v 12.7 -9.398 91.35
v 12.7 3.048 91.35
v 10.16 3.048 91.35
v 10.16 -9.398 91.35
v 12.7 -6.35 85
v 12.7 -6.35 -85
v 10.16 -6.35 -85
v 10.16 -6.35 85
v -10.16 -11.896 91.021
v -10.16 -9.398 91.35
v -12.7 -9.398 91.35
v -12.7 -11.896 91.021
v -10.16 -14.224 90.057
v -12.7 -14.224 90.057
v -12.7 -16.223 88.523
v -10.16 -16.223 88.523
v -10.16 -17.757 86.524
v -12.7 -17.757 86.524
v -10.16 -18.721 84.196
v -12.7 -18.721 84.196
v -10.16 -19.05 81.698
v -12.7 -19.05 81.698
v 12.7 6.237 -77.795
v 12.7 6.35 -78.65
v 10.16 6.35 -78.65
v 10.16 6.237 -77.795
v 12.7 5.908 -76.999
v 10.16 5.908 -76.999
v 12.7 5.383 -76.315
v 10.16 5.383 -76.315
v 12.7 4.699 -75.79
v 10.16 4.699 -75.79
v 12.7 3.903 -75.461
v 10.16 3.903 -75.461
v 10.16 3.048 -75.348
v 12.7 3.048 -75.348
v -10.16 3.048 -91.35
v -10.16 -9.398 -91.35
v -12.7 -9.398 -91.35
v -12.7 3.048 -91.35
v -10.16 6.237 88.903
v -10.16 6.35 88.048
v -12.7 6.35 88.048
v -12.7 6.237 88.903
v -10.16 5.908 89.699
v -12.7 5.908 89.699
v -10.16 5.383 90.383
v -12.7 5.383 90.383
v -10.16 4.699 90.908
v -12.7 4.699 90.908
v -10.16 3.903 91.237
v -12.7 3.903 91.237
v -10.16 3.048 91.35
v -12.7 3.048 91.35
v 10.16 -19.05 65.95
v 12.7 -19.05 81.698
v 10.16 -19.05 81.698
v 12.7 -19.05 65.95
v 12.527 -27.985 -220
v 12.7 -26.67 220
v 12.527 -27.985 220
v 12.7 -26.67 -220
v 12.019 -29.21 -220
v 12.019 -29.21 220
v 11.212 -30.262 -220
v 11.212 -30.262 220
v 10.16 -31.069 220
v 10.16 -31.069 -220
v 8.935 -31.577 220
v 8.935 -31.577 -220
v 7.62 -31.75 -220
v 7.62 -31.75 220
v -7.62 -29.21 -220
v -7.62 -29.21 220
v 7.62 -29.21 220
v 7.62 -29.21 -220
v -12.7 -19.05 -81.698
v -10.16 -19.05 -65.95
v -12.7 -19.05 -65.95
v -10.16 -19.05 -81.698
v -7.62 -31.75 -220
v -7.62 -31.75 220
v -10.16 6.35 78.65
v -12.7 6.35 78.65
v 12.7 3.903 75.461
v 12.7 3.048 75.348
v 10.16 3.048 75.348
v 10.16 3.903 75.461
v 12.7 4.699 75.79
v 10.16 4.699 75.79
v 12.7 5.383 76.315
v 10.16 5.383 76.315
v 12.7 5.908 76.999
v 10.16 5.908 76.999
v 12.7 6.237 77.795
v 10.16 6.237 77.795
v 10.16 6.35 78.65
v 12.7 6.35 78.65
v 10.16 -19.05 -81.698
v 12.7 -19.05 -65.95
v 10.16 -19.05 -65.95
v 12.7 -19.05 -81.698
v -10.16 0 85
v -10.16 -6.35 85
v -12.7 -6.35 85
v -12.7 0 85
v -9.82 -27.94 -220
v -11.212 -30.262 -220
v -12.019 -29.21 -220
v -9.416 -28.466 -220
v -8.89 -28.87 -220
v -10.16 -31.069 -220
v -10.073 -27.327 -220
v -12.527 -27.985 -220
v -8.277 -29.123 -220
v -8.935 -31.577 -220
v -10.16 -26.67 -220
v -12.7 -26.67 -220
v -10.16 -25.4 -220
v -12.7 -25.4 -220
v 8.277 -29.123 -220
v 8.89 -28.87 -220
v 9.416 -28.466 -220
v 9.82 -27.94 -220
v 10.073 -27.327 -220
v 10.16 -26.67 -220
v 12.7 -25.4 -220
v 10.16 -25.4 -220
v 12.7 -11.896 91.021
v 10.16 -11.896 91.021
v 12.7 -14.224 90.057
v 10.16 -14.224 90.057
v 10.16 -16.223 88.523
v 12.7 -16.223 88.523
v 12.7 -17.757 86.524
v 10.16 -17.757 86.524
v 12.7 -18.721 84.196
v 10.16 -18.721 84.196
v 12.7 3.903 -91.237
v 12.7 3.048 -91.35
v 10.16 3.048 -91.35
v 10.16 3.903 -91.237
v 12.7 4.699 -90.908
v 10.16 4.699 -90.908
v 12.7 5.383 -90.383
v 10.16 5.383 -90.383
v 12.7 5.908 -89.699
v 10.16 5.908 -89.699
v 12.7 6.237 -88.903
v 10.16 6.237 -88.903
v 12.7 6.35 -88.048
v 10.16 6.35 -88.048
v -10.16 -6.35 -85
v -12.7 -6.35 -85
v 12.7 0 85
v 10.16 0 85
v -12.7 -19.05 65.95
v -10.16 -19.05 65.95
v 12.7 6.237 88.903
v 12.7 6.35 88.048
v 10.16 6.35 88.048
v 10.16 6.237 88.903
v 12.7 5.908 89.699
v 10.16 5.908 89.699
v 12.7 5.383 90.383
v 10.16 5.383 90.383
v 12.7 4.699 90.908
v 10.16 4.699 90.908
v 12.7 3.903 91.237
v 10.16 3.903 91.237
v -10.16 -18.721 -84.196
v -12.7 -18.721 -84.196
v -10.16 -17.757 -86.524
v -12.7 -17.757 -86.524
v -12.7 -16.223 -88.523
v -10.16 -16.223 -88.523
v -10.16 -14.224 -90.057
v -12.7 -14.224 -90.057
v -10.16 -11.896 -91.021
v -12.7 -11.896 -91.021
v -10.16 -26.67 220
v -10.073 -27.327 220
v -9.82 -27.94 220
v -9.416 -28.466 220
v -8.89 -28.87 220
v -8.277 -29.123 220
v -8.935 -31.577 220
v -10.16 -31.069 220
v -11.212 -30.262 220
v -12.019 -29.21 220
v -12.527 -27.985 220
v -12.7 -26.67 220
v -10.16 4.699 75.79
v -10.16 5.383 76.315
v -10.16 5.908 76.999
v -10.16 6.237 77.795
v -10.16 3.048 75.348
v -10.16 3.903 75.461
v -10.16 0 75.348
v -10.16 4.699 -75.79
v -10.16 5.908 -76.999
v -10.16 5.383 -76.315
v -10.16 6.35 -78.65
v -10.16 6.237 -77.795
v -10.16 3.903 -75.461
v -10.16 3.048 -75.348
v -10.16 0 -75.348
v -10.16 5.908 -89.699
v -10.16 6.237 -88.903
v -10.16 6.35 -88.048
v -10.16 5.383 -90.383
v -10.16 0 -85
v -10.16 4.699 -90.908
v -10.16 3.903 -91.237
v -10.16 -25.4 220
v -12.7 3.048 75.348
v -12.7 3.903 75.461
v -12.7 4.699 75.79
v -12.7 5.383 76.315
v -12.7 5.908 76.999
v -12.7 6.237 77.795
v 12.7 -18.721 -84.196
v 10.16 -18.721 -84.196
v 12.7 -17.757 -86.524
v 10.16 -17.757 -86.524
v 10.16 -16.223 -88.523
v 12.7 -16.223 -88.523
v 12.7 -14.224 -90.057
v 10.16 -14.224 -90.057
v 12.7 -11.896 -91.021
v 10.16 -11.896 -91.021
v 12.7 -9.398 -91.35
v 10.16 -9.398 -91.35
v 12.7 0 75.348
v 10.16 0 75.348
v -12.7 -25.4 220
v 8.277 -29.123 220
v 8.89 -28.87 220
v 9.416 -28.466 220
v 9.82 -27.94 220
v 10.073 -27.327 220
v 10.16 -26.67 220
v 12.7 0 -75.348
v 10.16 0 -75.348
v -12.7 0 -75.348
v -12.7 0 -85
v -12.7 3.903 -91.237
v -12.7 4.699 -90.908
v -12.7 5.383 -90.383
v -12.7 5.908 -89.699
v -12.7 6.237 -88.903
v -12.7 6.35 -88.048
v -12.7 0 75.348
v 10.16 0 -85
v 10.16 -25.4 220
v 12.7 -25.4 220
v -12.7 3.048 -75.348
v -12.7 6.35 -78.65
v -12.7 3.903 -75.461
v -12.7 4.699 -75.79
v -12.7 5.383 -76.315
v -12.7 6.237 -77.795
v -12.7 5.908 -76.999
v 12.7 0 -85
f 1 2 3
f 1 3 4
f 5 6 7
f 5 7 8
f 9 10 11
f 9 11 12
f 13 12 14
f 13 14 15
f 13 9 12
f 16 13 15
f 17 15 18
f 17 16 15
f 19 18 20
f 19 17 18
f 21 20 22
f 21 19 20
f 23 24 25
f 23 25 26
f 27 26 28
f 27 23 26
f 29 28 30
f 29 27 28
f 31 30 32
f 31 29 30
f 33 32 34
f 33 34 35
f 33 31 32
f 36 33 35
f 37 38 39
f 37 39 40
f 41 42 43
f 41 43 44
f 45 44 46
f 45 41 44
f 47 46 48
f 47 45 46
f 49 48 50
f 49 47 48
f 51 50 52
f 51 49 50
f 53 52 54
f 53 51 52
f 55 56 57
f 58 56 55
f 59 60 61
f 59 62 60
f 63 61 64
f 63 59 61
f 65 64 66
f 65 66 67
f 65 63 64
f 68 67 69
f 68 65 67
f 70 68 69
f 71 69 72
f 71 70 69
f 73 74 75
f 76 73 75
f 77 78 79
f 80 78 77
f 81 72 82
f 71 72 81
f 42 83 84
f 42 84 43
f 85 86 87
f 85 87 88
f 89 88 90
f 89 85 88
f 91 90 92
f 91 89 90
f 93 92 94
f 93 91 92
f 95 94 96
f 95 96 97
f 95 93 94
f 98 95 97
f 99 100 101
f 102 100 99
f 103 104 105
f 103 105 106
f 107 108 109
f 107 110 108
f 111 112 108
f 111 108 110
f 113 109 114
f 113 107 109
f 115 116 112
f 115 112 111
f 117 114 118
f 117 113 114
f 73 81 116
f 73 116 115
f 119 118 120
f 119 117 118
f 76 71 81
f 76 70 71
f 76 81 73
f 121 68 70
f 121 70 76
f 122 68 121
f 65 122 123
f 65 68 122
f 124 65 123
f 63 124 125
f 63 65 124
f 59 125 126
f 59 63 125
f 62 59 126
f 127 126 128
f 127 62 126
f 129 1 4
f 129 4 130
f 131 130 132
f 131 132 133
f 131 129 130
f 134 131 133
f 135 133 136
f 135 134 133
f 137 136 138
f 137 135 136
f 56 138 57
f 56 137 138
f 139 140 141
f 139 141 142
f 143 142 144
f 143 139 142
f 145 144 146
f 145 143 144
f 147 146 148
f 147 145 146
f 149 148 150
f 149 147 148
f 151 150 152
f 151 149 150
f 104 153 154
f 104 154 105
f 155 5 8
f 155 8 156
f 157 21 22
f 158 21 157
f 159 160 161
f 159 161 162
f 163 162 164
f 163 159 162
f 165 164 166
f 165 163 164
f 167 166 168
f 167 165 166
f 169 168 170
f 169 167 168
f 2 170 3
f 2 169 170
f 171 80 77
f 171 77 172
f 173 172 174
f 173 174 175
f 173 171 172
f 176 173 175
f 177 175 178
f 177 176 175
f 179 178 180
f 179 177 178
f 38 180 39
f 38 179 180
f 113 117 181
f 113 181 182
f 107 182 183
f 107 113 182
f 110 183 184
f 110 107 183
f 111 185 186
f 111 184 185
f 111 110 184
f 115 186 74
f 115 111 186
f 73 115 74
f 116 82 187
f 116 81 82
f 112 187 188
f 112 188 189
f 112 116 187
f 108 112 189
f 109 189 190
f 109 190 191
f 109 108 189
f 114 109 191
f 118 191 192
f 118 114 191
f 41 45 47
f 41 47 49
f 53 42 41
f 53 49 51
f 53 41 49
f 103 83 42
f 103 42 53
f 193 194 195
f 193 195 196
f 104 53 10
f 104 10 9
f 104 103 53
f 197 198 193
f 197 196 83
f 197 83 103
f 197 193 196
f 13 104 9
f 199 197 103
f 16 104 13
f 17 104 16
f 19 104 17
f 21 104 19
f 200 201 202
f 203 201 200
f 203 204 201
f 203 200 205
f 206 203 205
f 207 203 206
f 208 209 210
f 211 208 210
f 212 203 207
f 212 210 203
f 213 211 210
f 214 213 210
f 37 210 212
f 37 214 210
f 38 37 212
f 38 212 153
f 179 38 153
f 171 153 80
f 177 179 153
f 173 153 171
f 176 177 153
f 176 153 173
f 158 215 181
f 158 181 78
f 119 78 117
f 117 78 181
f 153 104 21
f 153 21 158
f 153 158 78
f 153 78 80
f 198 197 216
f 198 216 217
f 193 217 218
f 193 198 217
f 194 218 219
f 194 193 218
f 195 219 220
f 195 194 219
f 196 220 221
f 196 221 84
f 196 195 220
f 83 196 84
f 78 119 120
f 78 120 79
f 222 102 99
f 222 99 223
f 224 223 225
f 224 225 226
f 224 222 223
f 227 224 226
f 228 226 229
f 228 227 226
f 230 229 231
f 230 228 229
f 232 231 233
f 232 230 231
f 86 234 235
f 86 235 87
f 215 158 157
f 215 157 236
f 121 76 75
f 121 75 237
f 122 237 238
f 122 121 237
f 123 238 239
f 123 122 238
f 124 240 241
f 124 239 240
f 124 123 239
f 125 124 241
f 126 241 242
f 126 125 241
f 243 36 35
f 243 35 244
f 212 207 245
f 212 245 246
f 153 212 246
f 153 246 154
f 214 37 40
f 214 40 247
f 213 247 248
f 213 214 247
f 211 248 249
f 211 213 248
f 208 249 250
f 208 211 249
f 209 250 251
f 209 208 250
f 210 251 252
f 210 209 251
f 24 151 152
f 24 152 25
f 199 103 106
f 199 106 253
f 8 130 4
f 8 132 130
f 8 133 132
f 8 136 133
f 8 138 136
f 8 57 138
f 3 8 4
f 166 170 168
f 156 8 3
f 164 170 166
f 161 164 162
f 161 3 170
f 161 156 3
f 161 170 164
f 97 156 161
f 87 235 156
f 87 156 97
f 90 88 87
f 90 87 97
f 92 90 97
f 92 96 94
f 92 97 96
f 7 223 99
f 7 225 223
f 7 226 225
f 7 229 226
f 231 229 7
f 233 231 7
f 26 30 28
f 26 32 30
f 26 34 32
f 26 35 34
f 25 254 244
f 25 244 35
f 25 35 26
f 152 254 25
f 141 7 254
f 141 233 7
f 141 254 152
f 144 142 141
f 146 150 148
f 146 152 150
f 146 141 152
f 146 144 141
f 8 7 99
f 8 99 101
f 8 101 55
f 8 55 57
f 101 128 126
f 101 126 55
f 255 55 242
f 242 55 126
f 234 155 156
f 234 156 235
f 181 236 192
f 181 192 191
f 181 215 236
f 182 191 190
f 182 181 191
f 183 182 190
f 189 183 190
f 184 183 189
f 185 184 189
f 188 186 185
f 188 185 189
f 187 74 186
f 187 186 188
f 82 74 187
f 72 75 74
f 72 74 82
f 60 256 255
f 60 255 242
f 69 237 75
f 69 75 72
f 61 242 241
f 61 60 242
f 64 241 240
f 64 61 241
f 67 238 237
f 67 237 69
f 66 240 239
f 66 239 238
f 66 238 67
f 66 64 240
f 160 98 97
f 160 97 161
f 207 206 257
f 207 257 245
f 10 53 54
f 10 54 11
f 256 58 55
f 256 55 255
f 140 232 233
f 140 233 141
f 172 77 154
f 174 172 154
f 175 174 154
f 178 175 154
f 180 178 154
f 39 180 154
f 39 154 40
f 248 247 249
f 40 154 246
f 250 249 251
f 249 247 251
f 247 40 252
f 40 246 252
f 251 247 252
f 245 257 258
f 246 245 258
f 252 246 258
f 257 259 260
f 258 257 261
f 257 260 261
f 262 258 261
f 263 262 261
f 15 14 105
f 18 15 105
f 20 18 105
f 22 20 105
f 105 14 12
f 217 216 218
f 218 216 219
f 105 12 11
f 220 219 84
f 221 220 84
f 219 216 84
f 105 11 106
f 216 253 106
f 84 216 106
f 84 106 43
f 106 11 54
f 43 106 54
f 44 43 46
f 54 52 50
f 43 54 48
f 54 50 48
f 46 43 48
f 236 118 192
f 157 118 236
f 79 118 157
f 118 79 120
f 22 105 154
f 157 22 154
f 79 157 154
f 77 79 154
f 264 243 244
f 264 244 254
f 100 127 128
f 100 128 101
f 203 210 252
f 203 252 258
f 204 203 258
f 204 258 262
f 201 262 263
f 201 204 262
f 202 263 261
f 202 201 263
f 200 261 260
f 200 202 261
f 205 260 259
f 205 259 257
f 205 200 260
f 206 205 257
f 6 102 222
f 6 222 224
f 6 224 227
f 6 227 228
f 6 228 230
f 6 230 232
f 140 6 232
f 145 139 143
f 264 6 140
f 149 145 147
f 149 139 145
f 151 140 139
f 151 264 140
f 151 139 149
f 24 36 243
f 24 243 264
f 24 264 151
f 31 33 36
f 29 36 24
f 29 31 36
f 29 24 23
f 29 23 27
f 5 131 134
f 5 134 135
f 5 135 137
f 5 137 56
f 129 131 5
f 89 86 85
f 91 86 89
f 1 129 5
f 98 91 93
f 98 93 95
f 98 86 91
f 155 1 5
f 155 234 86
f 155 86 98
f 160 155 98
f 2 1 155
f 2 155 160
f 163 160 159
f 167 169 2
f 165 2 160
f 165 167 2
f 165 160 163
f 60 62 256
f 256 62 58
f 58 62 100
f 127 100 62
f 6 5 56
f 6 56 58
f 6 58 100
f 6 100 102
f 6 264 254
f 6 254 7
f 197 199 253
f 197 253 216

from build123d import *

# Parameters (mm, degrees)
F1_DEPTH      = 12.7
F2_R          = 5.08
F4_DEPTH      = 220.001
F4_DEPTH_BACK = 220.001


with BuildPart() as f1:
    # F0 (on Right) → F1 (new body, symmetric)
    with BuildSketch(Plane.YZ):
        with BuildLine():
            Line((-25.4, 220), (-31.75, 220))
            Line((-31.75, 220), (-31.75, -220))
            Line((-31.75, -220), (-25.4, -220))
            Line((-25.4, -220), (-19.05, -65.95))
            Line((-19.05, -65.95), (-19.05, -81.698))
            ThreePointArc((-19.05, -81.698), (-16.222995, -88.522995), (-9.398, -91.35))
            Line((-9.398, -91.35), (3.048, -91.35))
            ThreePointArc((3.048, -91.35), (5.382867, -90.382867), (6.35, -88.048))
            Line((6.35, -88.048), (6.35, -78.65))
            ThreePointArc((6.35, -78.65), (5.382867, -76.315133), (3.048, -75.348))
            Line((3.048, -75.348), (0, -75.348))
            Line((0, -75.348), (0, -85))
            Line((0, -85), (-6.35, -85))
            Line((-6.35, -85), (-6.35, 85))
            Line((-6.35, 85), (0, 85))
            Line((0, 85), (0, 75.348))
            Line((0, 75.348), (3.048, 75.348))
            ThreePointArc((3.048, 75.348), (5.382867, 76.315133), (6.35, 78.65))
            Line((6.35, 78.65), (6.35, 88.048))
            ThreePointArc((6.35, 88.048), (5.382867, 90.382867), (3.048, 91.35))
            Line((3.048, 91.35), (-9.398, 91.35))
            ThreePointArc((-9.398, 91.35), (-16.222995, 88.522995), (-19.05, 81.698))
            Line((-19.05, 81.698), (-19.05, 65.95))
            Line((-19.05, 65.95), (-25.4, 220))
        make_face()
    extrude(amount=F1_DEPTH, both=True)

    # F2
    f2_edges = [f1.edges().sort_by_distance(p)[0] for p in [
        (12.7, -31.75, 0),
        (-12.7, -31.75, 0),
    ]]
    fillet(f2_edges, radius=F2_R)

    # F3 (on Top) → F4 (cut, two sides)
    with BuildSketch(Plane.XY) as f4_sk:
        with BuildLine():
            Line((10.16, -26.67), (10.16, 6.35))
            Line((10.16, 6.35), (-10.16, 6.35))
            Line((-10.16, 6.35), (-10.16, -26.67))
            ThreePointArc((-10.16, -26.67), (-9.416051, -28.466051), (-7.62, -29.21))
            Line((-7.62, -29.21), (7.62, -29.21))
            ThreePointArc((7.62, -29.21), (9.416051, -28.466051), (10.16, -26.67))
        make_face()
    extrude(amount=F4_DEPTH, mode=Mode.SUBTRACT)
    extrude(f4_sk.sketch, amount=-F4_DEPTH_BACK, mode=Mode.SUBTRACT)


solid = f1.part
